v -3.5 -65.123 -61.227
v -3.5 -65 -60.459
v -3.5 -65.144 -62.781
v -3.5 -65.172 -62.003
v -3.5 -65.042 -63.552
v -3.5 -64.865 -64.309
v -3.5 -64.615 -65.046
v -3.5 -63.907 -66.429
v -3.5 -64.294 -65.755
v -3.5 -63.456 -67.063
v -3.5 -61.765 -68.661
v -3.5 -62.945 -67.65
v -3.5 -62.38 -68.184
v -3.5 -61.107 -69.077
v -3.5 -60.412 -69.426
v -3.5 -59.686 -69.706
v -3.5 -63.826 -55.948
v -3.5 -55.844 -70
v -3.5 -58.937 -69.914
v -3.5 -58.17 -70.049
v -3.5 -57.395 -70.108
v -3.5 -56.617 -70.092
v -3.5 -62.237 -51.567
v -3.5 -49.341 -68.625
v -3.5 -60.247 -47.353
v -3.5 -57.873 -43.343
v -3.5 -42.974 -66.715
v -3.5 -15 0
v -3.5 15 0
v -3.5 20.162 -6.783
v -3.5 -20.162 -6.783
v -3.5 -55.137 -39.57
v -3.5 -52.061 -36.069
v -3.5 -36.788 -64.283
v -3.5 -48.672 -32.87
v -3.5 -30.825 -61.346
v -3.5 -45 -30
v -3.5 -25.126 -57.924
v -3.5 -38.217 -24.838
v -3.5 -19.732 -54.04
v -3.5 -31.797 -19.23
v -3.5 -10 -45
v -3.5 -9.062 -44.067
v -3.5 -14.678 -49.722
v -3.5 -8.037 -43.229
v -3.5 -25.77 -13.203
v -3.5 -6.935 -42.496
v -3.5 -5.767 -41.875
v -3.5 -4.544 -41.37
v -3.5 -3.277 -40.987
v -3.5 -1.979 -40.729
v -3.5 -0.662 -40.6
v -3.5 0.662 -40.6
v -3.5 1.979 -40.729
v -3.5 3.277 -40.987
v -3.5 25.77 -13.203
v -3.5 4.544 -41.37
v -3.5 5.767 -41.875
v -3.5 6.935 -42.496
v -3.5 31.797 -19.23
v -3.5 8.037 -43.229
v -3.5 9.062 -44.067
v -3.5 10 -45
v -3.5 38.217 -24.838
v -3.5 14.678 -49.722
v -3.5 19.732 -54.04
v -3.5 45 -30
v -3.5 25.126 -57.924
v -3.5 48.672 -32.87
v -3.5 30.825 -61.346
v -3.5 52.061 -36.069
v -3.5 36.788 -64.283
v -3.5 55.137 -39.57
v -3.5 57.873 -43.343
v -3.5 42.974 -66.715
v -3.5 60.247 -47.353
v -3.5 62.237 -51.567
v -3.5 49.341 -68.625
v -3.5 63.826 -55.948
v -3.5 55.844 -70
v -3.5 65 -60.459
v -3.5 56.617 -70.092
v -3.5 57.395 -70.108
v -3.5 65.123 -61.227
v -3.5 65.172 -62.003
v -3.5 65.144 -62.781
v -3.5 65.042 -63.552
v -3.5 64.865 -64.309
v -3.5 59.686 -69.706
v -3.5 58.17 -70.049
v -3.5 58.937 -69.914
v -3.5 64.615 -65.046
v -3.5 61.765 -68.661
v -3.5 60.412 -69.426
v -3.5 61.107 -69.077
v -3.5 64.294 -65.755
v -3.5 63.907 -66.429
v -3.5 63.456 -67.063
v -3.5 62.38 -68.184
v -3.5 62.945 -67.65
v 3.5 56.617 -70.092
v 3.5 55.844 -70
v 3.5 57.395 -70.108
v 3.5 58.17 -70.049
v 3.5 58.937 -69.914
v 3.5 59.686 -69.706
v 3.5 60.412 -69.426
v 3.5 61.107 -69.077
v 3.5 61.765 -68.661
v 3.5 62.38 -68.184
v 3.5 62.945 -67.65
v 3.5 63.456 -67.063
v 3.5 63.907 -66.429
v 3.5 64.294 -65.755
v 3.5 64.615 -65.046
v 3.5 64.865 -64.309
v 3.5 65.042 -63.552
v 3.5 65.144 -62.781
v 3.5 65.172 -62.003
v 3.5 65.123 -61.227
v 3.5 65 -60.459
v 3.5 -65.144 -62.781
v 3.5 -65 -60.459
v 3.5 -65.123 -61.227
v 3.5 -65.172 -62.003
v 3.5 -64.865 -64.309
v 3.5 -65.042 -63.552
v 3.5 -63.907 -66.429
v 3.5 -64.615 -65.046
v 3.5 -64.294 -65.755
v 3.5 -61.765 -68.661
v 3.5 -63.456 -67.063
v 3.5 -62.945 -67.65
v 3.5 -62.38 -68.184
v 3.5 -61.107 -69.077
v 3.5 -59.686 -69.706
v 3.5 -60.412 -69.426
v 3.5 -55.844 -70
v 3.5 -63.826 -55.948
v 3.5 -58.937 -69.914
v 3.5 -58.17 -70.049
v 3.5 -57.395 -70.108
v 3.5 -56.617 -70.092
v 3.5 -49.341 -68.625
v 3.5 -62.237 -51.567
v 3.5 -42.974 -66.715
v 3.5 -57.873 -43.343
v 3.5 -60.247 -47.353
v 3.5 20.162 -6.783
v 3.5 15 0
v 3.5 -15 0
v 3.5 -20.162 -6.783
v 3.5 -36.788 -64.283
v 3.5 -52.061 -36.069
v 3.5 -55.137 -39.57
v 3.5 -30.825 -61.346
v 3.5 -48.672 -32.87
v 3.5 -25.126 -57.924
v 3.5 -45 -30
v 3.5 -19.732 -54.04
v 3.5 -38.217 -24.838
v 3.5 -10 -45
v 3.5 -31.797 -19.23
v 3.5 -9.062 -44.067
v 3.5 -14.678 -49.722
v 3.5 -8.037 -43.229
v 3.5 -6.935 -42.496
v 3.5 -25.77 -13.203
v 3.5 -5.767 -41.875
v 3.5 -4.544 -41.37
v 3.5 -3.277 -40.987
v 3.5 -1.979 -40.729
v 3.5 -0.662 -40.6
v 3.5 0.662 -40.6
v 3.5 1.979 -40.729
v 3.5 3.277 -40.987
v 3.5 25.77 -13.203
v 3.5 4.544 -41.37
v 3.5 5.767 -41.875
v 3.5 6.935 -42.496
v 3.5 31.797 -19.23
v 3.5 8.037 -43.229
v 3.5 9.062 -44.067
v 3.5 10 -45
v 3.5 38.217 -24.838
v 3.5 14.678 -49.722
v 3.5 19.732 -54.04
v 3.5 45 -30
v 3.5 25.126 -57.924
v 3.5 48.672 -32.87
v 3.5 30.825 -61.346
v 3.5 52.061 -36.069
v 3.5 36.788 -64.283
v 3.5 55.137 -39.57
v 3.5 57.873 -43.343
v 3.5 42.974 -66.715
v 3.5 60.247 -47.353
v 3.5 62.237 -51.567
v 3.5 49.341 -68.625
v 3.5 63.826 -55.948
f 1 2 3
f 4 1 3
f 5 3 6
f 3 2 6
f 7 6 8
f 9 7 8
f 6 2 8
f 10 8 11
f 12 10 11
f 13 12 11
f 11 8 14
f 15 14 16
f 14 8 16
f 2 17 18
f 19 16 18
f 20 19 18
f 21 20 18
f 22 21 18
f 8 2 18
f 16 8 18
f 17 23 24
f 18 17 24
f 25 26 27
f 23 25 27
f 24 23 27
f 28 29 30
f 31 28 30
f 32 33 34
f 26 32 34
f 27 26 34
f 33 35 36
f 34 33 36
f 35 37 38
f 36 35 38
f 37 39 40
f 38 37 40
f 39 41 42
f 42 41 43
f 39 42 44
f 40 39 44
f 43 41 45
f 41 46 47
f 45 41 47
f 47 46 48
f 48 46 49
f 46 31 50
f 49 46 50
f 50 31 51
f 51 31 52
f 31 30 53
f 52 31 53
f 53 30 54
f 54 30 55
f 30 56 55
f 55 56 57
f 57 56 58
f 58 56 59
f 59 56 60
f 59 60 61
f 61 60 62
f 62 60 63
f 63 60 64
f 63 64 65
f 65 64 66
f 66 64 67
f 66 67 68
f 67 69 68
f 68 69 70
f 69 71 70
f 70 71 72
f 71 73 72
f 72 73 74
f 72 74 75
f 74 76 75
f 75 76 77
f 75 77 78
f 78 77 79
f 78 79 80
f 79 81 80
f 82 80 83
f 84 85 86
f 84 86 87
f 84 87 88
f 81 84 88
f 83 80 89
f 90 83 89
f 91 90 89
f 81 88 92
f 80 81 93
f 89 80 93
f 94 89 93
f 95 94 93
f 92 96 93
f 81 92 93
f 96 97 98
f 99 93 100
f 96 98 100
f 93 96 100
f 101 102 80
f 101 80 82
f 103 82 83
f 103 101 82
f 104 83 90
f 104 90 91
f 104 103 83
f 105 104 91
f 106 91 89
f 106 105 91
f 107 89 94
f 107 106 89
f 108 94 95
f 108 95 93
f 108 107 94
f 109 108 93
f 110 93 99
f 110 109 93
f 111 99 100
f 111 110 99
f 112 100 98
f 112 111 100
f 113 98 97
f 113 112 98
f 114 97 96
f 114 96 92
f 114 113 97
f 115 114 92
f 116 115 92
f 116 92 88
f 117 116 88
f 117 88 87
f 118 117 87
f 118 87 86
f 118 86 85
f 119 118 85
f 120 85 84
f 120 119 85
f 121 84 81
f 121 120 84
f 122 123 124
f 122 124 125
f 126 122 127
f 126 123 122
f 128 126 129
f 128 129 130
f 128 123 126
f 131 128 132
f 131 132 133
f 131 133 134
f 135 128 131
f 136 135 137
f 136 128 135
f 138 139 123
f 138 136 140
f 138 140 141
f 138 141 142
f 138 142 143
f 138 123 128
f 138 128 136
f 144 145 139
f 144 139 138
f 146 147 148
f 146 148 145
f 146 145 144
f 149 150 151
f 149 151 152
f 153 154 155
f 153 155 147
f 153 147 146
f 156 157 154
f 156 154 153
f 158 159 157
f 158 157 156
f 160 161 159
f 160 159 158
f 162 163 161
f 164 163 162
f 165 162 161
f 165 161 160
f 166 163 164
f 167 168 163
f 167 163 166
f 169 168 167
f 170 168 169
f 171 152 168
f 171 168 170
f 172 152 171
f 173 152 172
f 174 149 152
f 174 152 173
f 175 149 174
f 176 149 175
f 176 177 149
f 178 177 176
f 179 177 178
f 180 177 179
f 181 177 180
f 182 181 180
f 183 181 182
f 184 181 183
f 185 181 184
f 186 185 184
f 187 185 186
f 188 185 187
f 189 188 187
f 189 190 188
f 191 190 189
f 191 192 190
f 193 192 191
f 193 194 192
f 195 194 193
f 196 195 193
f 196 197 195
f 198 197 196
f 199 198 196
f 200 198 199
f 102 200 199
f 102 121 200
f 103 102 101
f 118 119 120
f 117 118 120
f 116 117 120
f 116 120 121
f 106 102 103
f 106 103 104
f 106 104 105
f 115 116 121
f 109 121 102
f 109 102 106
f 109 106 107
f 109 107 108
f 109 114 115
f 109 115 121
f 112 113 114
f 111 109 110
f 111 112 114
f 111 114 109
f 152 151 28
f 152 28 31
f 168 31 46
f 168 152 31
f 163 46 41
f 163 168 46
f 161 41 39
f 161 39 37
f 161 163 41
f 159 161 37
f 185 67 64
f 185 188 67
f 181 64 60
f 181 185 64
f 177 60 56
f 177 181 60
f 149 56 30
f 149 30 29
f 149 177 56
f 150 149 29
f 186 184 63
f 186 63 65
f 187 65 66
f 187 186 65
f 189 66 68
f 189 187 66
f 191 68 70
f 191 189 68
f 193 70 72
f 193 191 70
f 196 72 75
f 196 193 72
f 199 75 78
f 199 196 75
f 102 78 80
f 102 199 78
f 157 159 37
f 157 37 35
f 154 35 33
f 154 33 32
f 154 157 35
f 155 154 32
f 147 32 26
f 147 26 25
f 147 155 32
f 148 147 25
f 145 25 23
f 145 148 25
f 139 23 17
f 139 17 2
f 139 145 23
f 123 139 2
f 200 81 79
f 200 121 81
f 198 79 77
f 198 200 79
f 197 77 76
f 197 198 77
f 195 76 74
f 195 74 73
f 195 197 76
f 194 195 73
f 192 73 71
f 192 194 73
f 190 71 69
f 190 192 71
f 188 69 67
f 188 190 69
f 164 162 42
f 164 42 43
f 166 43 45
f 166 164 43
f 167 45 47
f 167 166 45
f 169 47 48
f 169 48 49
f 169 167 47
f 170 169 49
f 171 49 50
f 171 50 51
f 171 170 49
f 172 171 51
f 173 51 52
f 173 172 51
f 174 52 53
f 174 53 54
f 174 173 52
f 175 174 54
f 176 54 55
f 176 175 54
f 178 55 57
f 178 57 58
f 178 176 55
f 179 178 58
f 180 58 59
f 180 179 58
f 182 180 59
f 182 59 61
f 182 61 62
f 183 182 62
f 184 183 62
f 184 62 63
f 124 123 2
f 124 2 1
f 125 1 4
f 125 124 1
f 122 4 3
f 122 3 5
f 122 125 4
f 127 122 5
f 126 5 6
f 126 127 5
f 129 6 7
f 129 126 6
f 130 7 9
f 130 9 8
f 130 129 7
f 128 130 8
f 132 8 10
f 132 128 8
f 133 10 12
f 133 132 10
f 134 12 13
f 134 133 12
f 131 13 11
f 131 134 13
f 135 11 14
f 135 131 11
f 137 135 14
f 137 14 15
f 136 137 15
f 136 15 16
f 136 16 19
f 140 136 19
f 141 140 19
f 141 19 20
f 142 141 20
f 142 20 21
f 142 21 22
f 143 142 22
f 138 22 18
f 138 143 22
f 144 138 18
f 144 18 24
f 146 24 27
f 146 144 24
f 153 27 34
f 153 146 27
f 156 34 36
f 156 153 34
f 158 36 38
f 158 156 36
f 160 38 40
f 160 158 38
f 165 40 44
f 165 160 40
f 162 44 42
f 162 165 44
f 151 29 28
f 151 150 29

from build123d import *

# Parameters (mm, degrees)
BOSS_EXTRUDE1_DEPTH = 3.5


with BuildPart() as part:
    # Sketch1 → Boss-Extrude1 (new, symmetric)
    with BuildSketch(Plane(origin=(0, 0, 0), x_dir=(0, 0, -1), z_dir=(1, 0, 0))):
        with BuildLine():
            Line((0, 15), (0, -15))
            ThreePointArc((0, -15), (16.267428438, -28.732571562), (30, -45))
            ThreePointArc((30, -45), (43.342526908, -57.873390661), (60.45856181, -65))
            ThreePointArc((60.45856181, -65), (67.649976256, -62.944872105), (70, -55.84435235))
            ThreePointArc((70, -55.84435235), (61.345746077, -30.825000689), (45, -10))
            ThreePointArc((45, -10), (40.583973737, 0), (45, 10))
            ThreePointArc((45, 10), (61.345746077, 30.825000689), (70, 55.84435235))
            ThreePointArc((70, 55.84435235), (67.649976256, 62.944872105), (60.45856181, 65))
            ThreePointArc((60.45856181, 65), (43.342526908, 57.873390661), (30, 45))
            ThreePointArc((30, 45), (16.267428438, 28.732571562), (0, 15))
        make_face()
    extrude(amount=BOSS_EXTRUDE1_DEPTH, both=True)


solid = part.part
